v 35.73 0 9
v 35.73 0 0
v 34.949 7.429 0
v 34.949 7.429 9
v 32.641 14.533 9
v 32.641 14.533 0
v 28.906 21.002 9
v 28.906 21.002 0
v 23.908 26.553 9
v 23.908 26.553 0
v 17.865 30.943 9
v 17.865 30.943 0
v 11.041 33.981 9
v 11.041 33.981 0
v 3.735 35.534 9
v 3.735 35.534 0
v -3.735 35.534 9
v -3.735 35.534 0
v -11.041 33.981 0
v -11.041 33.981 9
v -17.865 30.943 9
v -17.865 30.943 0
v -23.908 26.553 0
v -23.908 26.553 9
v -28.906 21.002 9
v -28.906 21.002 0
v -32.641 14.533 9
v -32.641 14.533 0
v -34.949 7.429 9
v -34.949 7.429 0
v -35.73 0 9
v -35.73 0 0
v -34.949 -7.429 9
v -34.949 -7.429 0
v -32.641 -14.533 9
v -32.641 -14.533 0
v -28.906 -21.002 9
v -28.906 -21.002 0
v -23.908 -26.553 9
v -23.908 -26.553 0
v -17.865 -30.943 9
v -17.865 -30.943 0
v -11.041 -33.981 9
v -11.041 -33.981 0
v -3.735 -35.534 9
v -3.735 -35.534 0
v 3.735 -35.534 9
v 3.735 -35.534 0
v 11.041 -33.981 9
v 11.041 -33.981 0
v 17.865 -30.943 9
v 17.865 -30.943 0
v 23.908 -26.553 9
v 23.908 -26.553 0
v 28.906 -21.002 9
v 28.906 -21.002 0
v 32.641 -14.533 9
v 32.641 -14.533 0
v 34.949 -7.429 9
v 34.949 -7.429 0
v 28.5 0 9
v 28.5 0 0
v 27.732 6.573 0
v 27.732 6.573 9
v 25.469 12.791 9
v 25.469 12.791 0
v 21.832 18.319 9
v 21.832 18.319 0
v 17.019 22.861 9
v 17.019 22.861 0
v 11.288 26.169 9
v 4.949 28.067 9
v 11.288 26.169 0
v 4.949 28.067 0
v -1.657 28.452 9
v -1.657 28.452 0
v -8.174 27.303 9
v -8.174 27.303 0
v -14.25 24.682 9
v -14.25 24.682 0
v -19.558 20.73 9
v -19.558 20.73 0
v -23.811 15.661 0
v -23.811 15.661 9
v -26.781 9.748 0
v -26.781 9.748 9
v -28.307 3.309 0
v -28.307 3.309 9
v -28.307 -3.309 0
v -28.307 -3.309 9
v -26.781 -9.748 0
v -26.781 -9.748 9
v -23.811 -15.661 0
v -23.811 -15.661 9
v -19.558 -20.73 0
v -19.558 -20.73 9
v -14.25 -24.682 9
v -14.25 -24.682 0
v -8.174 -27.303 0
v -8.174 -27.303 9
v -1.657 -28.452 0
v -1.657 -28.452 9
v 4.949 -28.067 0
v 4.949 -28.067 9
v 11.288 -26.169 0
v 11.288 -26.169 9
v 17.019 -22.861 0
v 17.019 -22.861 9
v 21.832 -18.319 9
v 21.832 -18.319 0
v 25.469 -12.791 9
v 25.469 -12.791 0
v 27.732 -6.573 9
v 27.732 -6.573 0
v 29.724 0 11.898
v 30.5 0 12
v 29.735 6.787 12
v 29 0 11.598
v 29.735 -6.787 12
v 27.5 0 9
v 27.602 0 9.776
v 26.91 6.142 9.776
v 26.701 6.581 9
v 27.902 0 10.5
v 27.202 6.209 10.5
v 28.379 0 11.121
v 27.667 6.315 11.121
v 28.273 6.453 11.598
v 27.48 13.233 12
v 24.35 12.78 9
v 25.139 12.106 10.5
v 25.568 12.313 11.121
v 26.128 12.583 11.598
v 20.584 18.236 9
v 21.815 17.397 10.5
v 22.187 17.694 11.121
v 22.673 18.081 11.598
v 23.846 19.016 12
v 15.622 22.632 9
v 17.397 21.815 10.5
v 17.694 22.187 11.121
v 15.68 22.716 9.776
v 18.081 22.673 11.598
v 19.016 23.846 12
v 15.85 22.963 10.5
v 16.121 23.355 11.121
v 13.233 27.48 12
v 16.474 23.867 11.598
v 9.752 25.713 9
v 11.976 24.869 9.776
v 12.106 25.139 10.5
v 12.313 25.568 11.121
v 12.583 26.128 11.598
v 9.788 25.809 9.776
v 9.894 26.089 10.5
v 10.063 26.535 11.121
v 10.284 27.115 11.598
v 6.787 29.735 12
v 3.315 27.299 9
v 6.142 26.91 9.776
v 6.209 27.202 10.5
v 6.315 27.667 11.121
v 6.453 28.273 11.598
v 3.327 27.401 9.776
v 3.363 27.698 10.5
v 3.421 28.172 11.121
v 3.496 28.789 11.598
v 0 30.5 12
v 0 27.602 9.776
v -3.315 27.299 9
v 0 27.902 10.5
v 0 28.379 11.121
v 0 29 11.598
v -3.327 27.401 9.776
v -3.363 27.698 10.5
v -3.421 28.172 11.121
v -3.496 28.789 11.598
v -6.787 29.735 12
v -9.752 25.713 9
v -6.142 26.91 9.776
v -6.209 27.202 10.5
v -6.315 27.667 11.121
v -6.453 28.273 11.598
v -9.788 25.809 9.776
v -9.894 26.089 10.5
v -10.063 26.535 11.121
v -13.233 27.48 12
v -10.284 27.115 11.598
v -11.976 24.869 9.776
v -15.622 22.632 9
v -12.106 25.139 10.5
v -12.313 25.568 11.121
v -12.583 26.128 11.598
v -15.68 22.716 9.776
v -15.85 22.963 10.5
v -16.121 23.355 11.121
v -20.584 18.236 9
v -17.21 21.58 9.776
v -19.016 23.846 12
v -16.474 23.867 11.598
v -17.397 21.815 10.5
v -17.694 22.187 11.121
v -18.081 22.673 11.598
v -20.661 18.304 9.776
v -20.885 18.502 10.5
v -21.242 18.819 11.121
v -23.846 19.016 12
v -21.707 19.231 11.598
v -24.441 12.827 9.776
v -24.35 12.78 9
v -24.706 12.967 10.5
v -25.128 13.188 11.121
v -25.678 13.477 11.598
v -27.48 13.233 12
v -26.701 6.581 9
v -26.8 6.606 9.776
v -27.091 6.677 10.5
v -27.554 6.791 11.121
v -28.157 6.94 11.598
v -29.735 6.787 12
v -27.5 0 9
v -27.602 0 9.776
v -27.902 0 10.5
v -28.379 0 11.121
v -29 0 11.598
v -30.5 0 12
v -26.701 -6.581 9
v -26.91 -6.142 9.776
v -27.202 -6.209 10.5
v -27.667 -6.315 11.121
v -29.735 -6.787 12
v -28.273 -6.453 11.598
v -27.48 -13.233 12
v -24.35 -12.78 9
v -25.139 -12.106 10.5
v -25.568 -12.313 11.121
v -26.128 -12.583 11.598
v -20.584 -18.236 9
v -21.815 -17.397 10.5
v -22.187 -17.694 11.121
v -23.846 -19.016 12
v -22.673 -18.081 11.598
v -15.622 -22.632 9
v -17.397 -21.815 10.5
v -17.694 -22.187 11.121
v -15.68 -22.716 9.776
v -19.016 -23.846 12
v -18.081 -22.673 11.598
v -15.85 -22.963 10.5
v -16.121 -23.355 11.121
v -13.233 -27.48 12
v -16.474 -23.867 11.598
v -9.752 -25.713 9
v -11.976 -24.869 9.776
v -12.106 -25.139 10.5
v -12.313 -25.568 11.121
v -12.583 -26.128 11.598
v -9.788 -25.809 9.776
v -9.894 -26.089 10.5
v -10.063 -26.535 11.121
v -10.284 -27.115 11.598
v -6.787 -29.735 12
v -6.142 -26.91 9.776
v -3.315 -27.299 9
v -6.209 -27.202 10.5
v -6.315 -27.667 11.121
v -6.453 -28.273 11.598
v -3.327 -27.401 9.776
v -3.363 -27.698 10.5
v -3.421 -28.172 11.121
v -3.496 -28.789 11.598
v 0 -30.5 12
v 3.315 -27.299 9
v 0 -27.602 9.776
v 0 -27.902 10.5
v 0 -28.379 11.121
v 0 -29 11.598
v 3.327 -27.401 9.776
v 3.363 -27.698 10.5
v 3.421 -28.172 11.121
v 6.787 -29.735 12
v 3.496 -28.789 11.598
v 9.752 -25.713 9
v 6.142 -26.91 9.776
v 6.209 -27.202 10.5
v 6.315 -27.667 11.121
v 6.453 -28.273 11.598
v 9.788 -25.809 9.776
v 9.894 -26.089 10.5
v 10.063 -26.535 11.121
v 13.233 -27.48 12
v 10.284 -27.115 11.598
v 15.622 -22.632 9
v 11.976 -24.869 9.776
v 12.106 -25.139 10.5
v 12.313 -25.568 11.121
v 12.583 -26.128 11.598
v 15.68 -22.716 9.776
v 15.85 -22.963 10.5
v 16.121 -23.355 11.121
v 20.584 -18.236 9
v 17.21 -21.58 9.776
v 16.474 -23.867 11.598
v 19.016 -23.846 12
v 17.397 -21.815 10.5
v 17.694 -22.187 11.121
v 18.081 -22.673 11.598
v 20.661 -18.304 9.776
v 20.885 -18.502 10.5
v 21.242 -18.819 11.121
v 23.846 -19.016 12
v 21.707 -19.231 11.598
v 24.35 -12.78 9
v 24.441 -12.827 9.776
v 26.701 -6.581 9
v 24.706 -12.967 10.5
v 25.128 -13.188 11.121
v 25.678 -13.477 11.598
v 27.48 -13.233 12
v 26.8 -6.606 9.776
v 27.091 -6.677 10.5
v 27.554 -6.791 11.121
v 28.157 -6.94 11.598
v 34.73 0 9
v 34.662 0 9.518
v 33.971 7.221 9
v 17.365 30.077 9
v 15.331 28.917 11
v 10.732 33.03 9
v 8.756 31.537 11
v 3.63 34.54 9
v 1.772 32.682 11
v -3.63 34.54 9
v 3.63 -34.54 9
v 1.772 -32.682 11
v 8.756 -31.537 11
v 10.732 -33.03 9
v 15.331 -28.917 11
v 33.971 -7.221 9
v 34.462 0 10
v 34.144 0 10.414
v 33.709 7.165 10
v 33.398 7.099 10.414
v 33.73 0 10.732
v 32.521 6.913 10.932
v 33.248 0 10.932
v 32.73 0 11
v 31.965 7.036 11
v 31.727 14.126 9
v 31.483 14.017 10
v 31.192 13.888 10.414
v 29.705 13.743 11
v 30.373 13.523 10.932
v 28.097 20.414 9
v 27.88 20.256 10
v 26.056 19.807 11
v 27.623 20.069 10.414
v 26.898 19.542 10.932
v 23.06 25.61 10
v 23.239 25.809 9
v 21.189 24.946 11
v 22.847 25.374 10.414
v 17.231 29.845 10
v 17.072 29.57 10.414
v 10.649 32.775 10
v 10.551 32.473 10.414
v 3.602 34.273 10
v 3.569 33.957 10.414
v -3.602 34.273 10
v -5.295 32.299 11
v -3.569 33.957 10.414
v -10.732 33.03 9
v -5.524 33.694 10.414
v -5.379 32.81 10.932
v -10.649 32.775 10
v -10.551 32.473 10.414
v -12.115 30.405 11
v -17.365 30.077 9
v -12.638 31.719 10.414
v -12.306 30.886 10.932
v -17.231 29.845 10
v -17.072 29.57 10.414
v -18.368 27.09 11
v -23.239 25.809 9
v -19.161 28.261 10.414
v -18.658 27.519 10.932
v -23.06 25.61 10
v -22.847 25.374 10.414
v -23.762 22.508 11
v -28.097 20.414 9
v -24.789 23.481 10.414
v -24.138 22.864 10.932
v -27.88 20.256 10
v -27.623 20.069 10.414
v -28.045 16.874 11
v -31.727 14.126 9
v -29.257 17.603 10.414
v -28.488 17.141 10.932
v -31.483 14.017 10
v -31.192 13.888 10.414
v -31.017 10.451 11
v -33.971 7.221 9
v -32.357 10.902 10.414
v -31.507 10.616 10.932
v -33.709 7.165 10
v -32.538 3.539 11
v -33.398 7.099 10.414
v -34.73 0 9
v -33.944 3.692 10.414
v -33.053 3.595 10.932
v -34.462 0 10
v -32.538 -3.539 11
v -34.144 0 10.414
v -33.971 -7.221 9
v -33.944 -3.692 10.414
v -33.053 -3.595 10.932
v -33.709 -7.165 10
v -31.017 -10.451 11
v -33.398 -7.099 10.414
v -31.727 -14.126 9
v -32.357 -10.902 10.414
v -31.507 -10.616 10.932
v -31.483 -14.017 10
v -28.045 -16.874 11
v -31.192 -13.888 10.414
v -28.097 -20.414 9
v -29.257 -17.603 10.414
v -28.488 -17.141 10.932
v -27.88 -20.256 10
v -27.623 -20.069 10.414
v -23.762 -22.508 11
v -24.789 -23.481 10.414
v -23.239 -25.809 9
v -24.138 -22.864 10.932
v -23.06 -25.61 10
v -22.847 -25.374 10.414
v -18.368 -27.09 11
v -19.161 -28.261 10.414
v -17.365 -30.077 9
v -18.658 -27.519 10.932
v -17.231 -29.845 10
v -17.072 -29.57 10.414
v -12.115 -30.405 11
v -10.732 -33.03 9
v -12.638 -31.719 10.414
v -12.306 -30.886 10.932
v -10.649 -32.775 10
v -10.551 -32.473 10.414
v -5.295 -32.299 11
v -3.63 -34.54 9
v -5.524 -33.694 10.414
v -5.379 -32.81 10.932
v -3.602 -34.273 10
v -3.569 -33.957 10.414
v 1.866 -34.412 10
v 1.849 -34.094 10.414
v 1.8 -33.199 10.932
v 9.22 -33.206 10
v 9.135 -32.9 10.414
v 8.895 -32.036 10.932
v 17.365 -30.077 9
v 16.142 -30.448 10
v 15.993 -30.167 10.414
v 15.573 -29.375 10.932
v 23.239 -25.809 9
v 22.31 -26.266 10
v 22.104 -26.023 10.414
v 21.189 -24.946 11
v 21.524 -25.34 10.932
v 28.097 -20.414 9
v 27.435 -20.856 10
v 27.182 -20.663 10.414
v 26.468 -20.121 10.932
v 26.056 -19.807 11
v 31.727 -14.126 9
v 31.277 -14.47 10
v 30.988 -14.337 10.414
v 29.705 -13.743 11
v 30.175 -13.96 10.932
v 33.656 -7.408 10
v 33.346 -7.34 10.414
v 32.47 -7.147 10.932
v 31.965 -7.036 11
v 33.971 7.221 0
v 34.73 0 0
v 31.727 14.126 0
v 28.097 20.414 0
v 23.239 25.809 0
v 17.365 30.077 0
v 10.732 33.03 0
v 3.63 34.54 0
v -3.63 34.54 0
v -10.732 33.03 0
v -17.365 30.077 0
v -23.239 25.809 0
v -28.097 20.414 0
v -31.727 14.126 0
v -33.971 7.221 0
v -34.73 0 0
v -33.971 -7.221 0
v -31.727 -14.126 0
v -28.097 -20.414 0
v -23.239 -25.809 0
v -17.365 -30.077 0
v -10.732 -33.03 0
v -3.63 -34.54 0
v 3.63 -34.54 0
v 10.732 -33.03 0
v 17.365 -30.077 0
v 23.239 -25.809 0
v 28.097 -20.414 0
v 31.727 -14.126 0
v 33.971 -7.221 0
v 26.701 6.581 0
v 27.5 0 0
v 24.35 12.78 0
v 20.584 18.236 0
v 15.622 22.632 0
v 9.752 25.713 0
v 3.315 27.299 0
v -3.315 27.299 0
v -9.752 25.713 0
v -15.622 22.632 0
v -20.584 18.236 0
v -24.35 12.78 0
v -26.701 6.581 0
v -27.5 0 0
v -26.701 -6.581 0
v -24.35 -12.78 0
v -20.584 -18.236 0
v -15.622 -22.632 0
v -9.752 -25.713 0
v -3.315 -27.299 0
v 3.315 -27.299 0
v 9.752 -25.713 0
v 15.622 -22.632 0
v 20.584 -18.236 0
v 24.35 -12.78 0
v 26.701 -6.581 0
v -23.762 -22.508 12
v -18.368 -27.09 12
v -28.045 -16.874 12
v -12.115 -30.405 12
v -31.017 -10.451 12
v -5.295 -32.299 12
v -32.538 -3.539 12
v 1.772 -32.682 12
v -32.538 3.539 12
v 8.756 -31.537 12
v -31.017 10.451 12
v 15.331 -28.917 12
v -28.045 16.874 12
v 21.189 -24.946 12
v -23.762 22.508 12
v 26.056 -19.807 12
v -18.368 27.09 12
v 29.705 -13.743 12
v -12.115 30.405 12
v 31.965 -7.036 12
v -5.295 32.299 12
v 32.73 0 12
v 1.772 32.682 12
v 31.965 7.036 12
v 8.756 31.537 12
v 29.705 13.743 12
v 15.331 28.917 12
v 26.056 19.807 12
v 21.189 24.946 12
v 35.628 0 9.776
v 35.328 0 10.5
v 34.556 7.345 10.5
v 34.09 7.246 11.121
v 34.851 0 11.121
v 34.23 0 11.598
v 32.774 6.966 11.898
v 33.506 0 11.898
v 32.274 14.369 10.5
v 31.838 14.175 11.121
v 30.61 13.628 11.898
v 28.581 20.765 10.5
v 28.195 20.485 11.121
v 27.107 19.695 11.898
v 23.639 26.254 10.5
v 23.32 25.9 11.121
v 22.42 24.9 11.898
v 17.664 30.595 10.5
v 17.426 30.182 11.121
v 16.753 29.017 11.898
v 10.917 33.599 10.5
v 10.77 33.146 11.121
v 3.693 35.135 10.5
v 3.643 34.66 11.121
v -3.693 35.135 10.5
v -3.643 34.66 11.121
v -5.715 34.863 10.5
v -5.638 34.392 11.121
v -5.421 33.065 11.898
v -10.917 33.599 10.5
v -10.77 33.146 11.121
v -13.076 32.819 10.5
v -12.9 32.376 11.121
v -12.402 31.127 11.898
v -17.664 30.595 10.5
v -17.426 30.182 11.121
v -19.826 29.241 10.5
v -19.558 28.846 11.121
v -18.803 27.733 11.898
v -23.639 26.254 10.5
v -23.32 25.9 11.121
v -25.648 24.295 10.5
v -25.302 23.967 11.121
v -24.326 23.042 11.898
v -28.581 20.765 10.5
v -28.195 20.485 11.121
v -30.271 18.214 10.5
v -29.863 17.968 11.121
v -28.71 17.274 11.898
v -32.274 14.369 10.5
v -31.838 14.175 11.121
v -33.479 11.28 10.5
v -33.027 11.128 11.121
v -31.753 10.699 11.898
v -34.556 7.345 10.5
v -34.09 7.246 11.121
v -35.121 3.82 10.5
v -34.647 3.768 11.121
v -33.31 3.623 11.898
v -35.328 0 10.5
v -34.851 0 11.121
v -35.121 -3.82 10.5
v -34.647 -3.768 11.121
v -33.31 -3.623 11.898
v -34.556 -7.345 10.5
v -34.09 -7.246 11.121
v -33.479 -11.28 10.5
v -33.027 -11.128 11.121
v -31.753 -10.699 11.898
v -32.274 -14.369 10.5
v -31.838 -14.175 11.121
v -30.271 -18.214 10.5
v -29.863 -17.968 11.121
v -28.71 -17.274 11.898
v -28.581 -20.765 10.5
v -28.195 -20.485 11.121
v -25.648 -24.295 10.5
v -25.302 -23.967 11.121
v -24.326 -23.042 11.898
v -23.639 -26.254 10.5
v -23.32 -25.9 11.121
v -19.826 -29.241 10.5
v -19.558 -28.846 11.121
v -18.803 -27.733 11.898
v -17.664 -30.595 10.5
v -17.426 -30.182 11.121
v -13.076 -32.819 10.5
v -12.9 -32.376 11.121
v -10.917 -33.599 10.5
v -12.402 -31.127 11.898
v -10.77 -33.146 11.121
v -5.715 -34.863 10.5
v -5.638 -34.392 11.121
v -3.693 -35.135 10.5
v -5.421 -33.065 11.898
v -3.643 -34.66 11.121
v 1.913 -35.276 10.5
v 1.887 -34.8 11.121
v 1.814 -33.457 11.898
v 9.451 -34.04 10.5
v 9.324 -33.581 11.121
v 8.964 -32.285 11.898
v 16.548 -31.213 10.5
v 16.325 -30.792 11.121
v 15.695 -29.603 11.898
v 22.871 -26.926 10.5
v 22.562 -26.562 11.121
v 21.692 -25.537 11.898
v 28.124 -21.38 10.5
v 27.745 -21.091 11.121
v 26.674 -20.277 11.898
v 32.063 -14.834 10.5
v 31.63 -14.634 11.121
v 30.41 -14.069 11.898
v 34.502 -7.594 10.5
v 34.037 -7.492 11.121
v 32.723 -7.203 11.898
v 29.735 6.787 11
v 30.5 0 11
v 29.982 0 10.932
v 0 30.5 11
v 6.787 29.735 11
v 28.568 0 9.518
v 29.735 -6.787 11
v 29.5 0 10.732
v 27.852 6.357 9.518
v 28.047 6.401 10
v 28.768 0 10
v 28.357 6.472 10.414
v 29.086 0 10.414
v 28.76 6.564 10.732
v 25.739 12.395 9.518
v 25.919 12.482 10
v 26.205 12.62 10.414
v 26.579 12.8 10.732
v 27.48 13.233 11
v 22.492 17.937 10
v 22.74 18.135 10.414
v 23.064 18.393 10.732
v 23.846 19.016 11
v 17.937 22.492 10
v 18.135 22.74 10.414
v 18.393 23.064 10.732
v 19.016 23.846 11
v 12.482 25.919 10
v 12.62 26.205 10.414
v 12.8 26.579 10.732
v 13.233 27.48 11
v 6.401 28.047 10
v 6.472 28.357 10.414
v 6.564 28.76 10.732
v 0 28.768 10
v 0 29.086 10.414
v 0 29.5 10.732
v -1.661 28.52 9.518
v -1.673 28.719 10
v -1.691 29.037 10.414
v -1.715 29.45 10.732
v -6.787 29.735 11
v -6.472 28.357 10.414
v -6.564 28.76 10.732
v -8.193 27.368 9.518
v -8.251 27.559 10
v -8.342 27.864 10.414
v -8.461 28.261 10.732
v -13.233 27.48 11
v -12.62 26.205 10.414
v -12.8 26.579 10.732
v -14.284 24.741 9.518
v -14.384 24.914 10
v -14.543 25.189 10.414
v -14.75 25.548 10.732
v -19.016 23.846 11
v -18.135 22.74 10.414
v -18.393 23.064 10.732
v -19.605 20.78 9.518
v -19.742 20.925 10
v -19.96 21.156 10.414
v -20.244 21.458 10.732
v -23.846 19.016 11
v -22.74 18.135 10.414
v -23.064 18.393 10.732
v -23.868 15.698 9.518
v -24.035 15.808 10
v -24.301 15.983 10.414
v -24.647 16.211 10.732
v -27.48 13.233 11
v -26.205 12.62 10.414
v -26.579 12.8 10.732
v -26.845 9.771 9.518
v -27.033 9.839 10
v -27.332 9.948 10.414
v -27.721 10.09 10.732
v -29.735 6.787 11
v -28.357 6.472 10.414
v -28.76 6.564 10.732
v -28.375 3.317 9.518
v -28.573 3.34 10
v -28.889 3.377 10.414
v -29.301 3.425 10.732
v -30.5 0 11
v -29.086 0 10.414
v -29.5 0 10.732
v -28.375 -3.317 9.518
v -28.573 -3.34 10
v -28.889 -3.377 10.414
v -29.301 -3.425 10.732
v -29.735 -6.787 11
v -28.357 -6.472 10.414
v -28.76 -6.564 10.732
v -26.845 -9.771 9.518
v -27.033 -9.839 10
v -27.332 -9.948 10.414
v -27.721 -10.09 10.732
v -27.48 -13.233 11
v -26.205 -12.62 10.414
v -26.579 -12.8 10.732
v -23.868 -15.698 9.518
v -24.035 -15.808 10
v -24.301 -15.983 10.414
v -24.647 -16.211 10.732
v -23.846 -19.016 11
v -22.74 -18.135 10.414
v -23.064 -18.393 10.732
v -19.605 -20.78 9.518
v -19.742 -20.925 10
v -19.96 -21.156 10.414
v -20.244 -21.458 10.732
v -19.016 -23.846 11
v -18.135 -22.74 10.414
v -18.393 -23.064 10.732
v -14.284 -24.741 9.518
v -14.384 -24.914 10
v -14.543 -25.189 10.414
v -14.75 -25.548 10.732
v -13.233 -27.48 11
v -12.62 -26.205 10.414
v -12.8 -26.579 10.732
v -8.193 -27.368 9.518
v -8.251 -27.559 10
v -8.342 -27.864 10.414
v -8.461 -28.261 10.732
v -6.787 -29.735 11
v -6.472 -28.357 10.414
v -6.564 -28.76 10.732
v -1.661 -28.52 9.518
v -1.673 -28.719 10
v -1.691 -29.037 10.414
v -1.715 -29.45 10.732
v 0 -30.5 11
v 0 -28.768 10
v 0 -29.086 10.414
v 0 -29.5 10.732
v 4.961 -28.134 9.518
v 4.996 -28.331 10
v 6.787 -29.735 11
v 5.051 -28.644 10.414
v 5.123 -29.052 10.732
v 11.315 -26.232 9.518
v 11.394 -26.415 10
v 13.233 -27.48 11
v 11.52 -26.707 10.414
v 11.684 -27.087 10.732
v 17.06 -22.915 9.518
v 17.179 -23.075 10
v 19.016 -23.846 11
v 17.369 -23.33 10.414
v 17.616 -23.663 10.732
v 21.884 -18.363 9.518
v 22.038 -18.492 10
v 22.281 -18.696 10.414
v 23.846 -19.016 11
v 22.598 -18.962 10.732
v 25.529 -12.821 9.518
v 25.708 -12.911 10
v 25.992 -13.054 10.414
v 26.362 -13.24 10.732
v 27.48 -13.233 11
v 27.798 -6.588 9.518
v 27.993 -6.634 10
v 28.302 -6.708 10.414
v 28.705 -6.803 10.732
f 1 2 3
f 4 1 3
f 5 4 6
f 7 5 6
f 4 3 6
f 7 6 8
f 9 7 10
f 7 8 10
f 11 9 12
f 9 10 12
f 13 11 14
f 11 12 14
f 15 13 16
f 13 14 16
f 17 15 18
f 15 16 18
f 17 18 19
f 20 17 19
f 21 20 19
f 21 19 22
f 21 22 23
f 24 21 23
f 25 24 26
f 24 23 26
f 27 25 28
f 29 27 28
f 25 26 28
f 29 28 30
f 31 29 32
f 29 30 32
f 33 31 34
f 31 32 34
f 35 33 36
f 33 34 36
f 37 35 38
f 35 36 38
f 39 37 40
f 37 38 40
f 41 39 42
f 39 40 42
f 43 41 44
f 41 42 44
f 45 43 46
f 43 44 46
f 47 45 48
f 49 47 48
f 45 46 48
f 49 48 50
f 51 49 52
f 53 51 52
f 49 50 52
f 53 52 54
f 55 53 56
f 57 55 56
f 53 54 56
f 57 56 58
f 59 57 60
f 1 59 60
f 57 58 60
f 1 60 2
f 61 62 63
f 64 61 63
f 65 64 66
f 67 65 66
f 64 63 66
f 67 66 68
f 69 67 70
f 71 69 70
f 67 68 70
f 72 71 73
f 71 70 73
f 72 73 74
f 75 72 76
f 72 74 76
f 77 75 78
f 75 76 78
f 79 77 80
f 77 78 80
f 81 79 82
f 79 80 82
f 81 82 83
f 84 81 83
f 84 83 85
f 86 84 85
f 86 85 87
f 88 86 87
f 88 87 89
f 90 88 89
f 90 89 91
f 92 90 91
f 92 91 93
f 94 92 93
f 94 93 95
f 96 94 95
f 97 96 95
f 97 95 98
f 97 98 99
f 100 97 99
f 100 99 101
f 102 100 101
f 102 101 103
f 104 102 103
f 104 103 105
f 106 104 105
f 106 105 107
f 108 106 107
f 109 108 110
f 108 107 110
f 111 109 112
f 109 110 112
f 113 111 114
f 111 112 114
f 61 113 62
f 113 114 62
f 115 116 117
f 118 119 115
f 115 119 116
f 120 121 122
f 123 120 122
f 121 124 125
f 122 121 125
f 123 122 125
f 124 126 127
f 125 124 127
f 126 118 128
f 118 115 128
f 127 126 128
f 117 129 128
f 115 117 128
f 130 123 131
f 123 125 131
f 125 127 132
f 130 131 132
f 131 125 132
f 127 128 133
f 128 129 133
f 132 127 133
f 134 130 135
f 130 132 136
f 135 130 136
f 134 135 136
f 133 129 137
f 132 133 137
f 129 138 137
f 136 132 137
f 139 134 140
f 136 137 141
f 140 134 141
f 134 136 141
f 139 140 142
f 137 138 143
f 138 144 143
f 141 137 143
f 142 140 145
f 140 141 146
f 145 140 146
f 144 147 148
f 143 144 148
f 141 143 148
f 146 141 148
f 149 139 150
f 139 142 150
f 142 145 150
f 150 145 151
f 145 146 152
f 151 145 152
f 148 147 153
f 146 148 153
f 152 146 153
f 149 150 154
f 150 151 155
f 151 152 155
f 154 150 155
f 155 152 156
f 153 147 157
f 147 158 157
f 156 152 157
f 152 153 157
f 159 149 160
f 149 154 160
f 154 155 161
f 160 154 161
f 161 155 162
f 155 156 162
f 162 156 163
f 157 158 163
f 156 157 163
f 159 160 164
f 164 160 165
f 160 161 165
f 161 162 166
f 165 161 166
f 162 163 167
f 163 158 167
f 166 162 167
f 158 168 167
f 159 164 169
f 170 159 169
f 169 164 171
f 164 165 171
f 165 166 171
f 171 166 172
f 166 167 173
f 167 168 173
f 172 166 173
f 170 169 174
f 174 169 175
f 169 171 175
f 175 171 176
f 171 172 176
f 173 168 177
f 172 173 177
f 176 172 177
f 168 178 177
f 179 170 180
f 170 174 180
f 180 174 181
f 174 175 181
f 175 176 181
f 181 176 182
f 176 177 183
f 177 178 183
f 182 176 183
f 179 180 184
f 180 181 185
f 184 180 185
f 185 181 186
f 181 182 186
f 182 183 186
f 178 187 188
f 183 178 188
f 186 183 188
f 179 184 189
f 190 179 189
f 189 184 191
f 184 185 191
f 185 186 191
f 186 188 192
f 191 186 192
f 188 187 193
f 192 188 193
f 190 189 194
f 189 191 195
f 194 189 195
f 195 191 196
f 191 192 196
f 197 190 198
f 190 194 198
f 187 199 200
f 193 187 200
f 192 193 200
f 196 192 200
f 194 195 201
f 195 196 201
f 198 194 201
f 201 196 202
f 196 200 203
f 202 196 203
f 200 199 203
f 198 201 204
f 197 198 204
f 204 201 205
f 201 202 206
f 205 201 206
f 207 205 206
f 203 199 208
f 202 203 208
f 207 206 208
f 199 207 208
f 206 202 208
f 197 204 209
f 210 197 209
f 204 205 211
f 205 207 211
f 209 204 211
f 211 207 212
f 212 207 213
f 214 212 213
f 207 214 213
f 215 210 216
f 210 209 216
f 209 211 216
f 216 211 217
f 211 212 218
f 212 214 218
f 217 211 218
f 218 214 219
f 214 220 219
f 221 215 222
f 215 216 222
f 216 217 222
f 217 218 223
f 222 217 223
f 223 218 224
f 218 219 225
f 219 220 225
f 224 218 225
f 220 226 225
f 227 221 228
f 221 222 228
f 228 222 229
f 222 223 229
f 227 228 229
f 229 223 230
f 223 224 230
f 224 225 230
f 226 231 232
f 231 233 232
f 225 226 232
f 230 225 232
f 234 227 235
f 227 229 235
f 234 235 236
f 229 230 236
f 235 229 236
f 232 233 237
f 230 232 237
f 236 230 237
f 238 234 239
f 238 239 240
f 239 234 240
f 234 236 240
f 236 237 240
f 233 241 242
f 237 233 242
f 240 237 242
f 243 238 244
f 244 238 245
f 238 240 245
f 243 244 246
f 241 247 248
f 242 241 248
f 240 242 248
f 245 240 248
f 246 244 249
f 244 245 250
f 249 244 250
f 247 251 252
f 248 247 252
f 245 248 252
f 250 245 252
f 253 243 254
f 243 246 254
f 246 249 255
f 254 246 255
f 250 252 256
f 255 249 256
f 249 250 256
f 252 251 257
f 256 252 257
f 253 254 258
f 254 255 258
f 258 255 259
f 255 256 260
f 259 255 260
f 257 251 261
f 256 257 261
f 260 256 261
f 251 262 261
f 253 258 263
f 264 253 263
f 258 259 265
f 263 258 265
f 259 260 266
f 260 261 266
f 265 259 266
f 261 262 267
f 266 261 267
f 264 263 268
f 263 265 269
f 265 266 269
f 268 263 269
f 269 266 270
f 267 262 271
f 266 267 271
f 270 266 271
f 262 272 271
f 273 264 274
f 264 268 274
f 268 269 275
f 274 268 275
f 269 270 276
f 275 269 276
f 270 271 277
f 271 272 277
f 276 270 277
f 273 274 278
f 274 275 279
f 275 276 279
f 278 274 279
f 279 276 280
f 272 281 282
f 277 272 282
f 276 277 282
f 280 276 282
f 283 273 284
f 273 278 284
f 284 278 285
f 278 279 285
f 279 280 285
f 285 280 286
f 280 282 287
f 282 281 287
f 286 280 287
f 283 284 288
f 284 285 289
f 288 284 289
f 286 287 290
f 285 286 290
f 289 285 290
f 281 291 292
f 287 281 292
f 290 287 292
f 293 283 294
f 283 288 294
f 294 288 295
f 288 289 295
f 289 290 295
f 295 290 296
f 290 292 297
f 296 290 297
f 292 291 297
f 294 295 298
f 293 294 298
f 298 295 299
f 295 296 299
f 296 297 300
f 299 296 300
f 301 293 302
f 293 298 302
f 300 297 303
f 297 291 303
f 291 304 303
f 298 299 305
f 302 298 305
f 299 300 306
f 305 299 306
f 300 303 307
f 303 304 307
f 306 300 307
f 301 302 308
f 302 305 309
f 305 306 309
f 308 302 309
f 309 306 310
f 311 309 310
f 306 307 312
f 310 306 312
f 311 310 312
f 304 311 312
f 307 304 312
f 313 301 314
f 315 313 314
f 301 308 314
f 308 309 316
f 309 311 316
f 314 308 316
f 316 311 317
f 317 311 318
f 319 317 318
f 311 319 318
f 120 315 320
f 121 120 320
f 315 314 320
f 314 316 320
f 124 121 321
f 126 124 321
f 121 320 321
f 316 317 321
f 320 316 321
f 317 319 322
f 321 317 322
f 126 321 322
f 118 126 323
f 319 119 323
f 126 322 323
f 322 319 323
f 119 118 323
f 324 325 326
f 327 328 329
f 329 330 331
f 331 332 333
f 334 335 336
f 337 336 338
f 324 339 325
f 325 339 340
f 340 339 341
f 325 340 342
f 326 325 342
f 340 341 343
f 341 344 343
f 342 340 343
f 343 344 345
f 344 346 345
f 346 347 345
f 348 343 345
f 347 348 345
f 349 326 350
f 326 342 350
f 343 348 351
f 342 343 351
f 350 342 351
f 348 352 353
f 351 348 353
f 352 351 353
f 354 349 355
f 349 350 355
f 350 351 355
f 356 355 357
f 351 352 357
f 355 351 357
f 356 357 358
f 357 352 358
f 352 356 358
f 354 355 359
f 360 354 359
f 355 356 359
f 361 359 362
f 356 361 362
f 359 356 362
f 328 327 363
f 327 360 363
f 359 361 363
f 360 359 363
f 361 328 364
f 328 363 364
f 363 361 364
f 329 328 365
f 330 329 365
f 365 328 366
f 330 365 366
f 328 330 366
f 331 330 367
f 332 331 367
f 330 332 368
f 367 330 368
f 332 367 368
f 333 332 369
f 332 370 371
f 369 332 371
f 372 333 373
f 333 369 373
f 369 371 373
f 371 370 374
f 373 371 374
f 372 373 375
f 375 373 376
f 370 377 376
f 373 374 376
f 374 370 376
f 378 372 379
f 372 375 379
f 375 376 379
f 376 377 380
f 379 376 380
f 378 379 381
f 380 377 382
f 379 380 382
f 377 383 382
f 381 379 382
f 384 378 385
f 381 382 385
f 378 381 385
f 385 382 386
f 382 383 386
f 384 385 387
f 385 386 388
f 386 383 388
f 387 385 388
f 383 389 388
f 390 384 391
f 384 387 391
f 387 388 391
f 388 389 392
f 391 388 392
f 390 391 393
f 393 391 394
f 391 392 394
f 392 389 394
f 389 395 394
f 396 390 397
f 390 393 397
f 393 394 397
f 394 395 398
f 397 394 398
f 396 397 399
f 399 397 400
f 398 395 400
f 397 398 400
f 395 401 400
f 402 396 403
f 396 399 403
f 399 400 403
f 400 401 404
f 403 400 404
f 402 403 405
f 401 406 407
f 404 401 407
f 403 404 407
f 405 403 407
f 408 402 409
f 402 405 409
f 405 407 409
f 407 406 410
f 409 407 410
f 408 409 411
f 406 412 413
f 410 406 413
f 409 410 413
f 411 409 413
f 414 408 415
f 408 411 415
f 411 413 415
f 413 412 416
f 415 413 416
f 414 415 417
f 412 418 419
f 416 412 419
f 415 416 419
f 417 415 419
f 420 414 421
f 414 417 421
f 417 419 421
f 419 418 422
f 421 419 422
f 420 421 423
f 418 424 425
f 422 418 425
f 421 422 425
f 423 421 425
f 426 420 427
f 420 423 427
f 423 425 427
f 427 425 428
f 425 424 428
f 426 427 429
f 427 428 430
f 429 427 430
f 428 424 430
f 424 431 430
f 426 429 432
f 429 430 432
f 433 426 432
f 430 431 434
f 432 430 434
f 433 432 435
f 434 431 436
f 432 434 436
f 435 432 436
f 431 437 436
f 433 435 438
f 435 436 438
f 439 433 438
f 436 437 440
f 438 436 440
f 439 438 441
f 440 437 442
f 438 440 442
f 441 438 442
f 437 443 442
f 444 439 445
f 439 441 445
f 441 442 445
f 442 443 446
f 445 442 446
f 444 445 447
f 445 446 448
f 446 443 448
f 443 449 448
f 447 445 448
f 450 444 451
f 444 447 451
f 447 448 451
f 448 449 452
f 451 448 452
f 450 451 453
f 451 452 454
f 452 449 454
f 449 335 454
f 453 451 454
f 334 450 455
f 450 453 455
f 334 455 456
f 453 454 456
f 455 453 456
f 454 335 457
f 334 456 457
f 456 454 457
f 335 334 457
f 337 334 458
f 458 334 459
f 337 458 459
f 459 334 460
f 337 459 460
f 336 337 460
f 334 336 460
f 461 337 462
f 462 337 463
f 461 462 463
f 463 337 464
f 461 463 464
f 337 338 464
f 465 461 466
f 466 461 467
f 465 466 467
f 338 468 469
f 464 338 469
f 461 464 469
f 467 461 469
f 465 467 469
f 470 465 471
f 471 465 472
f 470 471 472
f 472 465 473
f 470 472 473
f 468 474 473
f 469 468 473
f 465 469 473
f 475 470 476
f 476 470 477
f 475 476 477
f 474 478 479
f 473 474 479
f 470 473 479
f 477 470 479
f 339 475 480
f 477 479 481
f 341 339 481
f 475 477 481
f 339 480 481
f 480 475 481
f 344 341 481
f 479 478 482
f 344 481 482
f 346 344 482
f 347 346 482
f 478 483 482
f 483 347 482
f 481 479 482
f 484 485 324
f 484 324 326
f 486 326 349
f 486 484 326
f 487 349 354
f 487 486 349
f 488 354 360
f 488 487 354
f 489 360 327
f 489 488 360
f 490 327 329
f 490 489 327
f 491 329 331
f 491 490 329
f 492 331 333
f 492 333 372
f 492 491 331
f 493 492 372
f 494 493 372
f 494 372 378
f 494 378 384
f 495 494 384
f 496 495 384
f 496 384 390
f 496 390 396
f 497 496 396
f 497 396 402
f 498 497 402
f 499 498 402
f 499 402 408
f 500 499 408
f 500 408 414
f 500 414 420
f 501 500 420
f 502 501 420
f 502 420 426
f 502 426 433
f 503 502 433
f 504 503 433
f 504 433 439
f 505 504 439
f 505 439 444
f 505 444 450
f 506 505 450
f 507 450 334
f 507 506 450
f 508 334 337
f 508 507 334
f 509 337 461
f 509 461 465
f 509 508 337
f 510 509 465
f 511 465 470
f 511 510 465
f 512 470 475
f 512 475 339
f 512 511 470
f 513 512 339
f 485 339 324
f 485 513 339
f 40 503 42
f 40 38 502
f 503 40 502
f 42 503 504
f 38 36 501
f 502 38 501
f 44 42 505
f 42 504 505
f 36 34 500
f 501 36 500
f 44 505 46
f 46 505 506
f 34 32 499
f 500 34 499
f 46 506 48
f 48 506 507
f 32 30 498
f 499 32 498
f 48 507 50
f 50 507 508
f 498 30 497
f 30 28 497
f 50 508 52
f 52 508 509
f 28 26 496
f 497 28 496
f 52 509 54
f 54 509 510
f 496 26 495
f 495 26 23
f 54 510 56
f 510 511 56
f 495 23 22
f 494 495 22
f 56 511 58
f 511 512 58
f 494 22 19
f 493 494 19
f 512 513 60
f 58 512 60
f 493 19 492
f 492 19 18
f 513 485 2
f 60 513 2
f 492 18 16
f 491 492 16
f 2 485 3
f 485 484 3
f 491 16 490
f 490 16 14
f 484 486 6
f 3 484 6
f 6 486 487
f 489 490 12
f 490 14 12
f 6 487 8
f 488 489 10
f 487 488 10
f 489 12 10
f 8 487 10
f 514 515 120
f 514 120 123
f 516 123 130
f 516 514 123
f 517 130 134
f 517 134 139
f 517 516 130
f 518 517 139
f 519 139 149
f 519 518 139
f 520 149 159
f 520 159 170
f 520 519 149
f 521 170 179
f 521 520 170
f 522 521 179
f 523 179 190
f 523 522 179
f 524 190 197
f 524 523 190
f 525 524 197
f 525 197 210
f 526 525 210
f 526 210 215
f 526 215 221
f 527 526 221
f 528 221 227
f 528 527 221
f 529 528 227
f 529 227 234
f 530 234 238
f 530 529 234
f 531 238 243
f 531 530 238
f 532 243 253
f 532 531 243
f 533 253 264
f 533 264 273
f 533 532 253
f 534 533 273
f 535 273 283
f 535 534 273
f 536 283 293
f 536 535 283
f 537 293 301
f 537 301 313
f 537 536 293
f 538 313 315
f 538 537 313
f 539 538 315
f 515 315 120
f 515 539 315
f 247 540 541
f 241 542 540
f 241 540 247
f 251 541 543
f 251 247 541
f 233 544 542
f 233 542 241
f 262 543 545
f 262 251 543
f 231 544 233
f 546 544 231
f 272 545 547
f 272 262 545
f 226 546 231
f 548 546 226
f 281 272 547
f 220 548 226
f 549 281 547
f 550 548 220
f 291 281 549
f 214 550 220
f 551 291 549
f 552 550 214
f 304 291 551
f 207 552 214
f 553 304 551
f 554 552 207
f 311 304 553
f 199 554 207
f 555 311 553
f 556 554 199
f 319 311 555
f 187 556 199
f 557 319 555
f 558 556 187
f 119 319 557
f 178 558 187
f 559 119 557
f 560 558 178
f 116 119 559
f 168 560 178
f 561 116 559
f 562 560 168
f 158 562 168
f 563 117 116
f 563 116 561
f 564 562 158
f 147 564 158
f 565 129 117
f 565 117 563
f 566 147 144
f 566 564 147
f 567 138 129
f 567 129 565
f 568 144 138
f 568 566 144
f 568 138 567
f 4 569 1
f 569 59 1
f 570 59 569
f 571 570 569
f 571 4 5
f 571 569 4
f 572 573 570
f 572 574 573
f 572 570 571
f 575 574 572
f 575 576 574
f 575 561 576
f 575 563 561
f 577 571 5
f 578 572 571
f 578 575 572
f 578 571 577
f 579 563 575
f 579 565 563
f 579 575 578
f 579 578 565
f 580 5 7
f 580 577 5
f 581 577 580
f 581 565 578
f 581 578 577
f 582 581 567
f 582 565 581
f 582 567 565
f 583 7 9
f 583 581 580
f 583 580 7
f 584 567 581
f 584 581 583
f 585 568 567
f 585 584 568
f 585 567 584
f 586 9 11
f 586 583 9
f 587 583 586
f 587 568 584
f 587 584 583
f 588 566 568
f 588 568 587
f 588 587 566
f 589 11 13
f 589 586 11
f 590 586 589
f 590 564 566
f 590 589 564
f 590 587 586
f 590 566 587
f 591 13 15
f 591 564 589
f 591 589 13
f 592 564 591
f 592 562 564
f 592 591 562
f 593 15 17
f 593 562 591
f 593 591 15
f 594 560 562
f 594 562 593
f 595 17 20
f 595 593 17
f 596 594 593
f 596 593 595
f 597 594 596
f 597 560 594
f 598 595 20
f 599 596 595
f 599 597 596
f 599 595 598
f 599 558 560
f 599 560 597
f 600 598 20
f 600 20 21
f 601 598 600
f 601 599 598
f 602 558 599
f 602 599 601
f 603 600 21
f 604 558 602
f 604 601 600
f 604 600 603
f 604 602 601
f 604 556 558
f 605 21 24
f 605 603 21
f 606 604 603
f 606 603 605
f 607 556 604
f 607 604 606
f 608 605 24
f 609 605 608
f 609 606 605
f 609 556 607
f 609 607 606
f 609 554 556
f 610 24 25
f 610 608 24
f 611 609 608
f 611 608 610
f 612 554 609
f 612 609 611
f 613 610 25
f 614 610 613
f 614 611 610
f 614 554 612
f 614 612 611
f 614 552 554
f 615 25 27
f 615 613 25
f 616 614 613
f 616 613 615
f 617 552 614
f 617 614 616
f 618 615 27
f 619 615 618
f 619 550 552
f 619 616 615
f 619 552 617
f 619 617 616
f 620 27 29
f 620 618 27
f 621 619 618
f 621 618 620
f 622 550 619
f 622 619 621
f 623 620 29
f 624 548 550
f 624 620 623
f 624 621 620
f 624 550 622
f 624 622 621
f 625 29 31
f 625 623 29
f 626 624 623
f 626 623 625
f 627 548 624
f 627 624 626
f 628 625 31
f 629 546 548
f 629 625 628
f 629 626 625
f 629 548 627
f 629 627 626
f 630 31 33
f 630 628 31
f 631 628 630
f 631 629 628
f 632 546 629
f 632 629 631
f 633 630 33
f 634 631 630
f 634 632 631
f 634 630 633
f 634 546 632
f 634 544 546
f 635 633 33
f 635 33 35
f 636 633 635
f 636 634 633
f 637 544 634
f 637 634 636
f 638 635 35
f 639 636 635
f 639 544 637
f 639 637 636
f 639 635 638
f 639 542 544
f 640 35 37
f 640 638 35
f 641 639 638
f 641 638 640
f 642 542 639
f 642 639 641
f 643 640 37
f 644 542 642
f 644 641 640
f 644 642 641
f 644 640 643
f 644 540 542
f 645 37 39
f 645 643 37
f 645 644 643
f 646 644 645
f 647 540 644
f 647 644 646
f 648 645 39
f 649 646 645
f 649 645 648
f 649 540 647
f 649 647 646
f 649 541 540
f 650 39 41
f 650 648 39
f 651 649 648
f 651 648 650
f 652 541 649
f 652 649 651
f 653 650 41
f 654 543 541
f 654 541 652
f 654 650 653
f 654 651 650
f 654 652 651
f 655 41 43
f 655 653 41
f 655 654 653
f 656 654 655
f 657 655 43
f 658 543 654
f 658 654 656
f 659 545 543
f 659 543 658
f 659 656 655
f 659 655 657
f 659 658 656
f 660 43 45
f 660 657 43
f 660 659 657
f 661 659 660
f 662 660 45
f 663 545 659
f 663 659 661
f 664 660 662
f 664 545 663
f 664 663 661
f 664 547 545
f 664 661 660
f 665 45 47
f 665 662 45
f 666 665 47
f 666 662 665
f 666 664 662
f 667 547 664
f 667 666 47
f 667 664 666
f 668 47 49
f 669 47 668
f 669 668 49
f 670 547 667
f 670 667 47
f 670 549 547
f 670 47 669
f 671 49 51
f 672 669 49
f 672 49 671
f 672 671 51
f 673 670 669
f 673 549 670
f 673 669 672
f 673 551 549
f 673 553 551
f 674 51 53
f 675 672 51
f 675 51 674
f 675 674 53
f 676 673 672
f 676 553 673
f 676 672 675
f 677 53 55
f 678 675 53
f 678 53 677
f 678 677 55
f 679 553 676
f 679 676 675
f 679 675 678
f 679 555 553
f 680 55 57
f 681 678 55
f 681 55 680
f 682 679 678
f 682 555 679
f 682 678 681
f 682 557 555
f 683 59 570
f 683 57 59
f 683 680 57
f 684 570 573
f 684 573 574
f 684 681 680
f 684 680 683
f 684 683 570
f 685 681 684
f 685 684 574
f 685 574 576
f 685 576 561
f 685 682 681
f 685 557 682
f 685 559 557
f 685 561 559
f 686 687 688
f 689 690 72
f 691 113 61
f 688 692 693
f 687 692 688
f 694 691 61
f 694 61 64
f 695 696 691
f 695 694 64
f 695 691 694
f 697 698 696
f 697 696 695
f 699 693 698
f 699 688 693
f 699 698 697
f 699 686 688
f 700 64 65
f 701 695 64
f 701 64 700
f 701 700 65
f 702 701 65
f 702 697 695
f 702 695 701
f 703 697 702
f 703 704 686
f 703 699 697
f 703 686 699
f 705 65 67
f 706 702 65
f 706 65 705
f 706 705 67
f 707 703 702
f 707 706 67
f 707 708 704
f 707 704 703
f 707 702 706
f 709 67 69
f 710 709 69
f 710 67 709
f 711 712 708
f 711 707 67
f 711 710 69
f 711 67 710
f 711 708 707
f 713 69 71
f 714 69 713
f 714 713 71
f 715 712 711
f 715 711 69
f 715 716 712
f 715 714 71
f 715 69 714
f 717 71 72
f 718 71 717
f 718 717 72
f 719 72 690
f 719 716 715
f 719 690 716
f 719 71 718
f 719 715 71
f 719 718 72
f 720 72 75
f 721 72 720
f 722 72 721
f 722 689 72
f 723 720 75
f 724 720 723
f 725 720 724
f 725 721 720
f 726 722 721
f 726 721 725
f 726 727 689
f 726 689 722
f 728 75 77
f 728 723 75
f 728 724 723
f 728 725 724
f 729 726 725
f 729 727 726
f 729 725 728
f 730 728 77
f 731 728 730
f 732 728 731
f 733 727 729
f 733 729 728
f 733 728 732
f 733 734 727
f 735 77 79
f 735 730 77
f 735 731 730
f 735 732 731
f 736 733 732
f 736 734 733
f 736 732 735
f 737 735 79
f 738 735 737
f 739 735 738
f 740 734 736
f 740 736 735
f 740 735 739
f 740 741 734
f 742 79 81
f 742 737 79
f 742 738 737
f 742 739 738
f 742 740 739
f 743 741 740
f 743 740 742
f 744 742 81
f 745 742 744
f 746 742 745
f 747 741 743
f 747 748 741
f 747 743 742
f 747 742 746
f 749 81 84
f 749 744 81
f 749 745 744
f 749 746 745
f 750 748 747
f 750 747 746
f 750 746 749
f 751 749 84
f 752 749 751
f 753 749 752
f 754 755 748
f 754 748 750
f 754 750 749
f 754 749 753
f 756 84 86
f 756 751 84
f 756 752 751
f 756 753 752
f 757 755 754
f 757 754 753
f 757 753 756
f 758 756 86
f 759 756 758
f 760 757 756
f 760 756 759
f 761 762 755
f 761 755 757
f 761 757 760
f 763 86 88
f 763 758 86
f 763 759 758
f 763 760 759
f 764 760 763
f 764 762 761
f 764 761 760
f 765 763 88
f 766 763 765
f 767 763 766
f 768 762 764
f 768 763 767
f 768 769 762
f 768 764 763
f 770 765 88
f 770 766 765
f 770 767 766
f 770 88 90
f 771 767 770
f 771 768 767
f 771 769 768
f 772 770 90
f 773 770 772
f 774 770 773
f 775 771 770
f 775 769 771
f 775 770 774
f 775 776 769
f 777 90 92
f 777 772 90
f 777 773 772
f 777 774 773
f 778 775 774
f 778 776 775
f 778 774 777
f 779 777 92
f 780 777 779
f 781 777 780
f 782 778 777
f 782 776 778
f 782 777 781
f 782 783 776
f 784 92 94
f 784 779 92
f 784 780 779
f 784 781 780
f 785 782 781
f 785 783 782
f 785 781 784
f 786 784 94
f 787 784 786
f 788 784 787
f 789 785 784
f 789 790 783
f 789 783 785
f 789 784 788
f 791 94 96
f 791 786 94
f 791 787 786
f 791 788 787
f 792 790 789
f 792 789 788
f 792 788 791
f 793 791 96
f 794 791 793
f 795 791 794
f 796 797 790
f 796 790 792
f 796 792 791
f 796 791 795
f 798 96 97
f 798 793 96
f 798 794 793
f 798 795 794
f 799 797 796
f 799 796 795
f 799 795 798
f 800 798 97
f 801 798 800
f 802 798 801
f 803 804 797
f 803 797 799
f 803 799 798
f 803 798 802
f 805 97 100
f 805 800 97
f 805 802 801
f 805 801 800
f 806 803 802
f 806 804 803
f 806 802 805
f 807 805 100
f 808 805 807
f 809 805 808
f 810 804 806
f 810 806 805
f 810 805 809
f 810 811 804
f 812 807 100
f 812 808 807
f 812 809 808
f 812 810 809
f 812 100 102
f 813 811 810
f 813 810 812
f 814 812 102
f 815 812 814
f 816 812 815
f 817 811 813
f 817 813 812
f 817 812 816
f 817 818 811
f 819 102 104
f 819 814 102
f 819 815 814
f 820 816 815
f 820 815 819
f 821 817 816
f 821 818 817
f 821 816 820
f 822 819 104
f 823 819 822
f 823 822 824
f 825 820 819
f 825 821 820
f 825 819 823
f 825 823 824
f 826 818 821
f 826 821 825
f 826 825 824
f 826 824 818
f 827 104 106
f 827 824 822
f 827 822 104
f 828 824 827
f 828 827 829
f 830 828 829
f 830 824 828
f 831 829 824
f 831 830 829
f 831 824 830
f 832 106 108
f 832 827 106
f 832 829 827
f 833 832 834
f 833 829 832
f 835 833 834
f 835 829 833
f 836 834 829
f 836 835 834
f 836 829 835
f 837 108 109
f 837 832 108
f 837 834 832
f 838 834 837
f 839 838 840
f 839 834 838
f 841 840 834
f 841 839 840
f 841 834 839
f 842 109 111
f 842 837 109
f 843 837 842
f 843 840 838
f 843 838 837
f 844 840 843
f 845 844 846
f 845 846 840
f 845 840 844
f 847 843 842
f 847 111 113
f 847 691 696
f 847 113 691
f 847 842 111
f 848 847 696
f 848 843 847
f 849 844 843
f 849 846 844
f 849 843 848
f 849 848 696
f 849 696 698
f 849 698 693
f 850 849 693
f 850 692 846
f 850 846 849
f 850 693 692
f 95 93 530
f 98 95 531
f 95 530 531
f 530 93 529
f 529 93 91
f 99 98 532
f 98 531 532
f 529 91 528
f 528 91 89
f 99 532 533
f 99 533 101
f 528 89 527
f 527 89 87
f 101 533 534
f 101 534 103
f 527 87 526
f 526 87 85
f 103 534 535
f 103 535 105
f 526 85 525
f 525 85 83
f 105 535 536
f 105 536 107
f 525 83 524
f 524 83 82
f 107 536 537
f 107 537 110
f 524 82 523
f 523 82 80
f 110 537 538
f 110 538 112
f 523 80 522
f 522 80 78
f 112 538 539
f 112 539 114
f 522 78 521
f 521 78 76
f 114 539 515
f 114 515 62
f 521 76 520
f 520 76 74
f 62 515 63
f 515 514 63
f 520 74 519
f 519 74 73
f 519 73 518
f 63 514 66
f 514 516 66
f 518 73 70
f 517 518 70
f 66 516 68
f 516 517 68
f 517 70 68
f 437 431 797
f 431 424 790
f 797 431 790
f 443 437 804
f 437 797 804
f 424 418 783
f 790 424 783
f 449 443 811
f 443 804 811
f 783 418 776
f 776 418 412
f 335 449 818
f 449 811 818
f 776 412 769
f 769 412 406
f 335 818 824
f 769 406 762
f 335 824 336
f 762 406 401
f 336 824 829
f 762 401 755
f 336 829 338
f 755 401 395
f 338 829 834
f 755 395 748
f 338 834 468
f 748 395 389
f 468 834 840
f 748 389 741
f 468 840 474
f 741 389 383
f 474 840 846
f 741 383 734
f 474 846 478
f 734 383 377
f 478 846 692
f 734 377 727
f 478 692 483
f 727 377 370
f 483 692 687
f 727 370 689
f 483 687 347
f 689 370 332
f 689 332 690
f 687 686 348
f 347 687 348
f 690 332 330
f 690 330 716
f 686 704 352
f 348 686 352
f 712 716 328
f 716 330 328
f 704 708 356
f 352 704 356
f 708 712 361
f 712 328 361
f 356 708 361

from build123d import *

# Parameters (mm, degrees)
SKETCH1_R           = 35.73
SKETCH1_R_2         = 27.5
BOSS_EXTRUDE1_DEPTH = 12
FILLET1_R           = 3
SHELL1_T            = -1


with BuildPart() as part:
    # Sketch1 → Boss-Extrude1 (new body)
    with BuildSketch(Plane.XY):
        Circle(SKETCH1_R)
        Circle(SKETCH1_R_2, mode=Mode.SUBTRACT)
    extrude(amount=BOSS_EXTRUDE1_DEPTH)

    # Fillet1
    fillet1_edges = [part.edges().sort_by_distance(p)[0] for p in [
        (-35.73, 0, 12),
        (-27.5, 0, 12),
    ]]
    fillet(fillet1_edges, radius=FILLET1_R)

    # Shell1
    shell1_openings = [part.faces().sort_by_distance(p)[0] for p in [
        (-34.719402988, 0, 0),
    ]]
    offset(amount=SHELL1_T, openings=shell1_openings, kind=Kind.INTERSECTION)


solid = part.part
